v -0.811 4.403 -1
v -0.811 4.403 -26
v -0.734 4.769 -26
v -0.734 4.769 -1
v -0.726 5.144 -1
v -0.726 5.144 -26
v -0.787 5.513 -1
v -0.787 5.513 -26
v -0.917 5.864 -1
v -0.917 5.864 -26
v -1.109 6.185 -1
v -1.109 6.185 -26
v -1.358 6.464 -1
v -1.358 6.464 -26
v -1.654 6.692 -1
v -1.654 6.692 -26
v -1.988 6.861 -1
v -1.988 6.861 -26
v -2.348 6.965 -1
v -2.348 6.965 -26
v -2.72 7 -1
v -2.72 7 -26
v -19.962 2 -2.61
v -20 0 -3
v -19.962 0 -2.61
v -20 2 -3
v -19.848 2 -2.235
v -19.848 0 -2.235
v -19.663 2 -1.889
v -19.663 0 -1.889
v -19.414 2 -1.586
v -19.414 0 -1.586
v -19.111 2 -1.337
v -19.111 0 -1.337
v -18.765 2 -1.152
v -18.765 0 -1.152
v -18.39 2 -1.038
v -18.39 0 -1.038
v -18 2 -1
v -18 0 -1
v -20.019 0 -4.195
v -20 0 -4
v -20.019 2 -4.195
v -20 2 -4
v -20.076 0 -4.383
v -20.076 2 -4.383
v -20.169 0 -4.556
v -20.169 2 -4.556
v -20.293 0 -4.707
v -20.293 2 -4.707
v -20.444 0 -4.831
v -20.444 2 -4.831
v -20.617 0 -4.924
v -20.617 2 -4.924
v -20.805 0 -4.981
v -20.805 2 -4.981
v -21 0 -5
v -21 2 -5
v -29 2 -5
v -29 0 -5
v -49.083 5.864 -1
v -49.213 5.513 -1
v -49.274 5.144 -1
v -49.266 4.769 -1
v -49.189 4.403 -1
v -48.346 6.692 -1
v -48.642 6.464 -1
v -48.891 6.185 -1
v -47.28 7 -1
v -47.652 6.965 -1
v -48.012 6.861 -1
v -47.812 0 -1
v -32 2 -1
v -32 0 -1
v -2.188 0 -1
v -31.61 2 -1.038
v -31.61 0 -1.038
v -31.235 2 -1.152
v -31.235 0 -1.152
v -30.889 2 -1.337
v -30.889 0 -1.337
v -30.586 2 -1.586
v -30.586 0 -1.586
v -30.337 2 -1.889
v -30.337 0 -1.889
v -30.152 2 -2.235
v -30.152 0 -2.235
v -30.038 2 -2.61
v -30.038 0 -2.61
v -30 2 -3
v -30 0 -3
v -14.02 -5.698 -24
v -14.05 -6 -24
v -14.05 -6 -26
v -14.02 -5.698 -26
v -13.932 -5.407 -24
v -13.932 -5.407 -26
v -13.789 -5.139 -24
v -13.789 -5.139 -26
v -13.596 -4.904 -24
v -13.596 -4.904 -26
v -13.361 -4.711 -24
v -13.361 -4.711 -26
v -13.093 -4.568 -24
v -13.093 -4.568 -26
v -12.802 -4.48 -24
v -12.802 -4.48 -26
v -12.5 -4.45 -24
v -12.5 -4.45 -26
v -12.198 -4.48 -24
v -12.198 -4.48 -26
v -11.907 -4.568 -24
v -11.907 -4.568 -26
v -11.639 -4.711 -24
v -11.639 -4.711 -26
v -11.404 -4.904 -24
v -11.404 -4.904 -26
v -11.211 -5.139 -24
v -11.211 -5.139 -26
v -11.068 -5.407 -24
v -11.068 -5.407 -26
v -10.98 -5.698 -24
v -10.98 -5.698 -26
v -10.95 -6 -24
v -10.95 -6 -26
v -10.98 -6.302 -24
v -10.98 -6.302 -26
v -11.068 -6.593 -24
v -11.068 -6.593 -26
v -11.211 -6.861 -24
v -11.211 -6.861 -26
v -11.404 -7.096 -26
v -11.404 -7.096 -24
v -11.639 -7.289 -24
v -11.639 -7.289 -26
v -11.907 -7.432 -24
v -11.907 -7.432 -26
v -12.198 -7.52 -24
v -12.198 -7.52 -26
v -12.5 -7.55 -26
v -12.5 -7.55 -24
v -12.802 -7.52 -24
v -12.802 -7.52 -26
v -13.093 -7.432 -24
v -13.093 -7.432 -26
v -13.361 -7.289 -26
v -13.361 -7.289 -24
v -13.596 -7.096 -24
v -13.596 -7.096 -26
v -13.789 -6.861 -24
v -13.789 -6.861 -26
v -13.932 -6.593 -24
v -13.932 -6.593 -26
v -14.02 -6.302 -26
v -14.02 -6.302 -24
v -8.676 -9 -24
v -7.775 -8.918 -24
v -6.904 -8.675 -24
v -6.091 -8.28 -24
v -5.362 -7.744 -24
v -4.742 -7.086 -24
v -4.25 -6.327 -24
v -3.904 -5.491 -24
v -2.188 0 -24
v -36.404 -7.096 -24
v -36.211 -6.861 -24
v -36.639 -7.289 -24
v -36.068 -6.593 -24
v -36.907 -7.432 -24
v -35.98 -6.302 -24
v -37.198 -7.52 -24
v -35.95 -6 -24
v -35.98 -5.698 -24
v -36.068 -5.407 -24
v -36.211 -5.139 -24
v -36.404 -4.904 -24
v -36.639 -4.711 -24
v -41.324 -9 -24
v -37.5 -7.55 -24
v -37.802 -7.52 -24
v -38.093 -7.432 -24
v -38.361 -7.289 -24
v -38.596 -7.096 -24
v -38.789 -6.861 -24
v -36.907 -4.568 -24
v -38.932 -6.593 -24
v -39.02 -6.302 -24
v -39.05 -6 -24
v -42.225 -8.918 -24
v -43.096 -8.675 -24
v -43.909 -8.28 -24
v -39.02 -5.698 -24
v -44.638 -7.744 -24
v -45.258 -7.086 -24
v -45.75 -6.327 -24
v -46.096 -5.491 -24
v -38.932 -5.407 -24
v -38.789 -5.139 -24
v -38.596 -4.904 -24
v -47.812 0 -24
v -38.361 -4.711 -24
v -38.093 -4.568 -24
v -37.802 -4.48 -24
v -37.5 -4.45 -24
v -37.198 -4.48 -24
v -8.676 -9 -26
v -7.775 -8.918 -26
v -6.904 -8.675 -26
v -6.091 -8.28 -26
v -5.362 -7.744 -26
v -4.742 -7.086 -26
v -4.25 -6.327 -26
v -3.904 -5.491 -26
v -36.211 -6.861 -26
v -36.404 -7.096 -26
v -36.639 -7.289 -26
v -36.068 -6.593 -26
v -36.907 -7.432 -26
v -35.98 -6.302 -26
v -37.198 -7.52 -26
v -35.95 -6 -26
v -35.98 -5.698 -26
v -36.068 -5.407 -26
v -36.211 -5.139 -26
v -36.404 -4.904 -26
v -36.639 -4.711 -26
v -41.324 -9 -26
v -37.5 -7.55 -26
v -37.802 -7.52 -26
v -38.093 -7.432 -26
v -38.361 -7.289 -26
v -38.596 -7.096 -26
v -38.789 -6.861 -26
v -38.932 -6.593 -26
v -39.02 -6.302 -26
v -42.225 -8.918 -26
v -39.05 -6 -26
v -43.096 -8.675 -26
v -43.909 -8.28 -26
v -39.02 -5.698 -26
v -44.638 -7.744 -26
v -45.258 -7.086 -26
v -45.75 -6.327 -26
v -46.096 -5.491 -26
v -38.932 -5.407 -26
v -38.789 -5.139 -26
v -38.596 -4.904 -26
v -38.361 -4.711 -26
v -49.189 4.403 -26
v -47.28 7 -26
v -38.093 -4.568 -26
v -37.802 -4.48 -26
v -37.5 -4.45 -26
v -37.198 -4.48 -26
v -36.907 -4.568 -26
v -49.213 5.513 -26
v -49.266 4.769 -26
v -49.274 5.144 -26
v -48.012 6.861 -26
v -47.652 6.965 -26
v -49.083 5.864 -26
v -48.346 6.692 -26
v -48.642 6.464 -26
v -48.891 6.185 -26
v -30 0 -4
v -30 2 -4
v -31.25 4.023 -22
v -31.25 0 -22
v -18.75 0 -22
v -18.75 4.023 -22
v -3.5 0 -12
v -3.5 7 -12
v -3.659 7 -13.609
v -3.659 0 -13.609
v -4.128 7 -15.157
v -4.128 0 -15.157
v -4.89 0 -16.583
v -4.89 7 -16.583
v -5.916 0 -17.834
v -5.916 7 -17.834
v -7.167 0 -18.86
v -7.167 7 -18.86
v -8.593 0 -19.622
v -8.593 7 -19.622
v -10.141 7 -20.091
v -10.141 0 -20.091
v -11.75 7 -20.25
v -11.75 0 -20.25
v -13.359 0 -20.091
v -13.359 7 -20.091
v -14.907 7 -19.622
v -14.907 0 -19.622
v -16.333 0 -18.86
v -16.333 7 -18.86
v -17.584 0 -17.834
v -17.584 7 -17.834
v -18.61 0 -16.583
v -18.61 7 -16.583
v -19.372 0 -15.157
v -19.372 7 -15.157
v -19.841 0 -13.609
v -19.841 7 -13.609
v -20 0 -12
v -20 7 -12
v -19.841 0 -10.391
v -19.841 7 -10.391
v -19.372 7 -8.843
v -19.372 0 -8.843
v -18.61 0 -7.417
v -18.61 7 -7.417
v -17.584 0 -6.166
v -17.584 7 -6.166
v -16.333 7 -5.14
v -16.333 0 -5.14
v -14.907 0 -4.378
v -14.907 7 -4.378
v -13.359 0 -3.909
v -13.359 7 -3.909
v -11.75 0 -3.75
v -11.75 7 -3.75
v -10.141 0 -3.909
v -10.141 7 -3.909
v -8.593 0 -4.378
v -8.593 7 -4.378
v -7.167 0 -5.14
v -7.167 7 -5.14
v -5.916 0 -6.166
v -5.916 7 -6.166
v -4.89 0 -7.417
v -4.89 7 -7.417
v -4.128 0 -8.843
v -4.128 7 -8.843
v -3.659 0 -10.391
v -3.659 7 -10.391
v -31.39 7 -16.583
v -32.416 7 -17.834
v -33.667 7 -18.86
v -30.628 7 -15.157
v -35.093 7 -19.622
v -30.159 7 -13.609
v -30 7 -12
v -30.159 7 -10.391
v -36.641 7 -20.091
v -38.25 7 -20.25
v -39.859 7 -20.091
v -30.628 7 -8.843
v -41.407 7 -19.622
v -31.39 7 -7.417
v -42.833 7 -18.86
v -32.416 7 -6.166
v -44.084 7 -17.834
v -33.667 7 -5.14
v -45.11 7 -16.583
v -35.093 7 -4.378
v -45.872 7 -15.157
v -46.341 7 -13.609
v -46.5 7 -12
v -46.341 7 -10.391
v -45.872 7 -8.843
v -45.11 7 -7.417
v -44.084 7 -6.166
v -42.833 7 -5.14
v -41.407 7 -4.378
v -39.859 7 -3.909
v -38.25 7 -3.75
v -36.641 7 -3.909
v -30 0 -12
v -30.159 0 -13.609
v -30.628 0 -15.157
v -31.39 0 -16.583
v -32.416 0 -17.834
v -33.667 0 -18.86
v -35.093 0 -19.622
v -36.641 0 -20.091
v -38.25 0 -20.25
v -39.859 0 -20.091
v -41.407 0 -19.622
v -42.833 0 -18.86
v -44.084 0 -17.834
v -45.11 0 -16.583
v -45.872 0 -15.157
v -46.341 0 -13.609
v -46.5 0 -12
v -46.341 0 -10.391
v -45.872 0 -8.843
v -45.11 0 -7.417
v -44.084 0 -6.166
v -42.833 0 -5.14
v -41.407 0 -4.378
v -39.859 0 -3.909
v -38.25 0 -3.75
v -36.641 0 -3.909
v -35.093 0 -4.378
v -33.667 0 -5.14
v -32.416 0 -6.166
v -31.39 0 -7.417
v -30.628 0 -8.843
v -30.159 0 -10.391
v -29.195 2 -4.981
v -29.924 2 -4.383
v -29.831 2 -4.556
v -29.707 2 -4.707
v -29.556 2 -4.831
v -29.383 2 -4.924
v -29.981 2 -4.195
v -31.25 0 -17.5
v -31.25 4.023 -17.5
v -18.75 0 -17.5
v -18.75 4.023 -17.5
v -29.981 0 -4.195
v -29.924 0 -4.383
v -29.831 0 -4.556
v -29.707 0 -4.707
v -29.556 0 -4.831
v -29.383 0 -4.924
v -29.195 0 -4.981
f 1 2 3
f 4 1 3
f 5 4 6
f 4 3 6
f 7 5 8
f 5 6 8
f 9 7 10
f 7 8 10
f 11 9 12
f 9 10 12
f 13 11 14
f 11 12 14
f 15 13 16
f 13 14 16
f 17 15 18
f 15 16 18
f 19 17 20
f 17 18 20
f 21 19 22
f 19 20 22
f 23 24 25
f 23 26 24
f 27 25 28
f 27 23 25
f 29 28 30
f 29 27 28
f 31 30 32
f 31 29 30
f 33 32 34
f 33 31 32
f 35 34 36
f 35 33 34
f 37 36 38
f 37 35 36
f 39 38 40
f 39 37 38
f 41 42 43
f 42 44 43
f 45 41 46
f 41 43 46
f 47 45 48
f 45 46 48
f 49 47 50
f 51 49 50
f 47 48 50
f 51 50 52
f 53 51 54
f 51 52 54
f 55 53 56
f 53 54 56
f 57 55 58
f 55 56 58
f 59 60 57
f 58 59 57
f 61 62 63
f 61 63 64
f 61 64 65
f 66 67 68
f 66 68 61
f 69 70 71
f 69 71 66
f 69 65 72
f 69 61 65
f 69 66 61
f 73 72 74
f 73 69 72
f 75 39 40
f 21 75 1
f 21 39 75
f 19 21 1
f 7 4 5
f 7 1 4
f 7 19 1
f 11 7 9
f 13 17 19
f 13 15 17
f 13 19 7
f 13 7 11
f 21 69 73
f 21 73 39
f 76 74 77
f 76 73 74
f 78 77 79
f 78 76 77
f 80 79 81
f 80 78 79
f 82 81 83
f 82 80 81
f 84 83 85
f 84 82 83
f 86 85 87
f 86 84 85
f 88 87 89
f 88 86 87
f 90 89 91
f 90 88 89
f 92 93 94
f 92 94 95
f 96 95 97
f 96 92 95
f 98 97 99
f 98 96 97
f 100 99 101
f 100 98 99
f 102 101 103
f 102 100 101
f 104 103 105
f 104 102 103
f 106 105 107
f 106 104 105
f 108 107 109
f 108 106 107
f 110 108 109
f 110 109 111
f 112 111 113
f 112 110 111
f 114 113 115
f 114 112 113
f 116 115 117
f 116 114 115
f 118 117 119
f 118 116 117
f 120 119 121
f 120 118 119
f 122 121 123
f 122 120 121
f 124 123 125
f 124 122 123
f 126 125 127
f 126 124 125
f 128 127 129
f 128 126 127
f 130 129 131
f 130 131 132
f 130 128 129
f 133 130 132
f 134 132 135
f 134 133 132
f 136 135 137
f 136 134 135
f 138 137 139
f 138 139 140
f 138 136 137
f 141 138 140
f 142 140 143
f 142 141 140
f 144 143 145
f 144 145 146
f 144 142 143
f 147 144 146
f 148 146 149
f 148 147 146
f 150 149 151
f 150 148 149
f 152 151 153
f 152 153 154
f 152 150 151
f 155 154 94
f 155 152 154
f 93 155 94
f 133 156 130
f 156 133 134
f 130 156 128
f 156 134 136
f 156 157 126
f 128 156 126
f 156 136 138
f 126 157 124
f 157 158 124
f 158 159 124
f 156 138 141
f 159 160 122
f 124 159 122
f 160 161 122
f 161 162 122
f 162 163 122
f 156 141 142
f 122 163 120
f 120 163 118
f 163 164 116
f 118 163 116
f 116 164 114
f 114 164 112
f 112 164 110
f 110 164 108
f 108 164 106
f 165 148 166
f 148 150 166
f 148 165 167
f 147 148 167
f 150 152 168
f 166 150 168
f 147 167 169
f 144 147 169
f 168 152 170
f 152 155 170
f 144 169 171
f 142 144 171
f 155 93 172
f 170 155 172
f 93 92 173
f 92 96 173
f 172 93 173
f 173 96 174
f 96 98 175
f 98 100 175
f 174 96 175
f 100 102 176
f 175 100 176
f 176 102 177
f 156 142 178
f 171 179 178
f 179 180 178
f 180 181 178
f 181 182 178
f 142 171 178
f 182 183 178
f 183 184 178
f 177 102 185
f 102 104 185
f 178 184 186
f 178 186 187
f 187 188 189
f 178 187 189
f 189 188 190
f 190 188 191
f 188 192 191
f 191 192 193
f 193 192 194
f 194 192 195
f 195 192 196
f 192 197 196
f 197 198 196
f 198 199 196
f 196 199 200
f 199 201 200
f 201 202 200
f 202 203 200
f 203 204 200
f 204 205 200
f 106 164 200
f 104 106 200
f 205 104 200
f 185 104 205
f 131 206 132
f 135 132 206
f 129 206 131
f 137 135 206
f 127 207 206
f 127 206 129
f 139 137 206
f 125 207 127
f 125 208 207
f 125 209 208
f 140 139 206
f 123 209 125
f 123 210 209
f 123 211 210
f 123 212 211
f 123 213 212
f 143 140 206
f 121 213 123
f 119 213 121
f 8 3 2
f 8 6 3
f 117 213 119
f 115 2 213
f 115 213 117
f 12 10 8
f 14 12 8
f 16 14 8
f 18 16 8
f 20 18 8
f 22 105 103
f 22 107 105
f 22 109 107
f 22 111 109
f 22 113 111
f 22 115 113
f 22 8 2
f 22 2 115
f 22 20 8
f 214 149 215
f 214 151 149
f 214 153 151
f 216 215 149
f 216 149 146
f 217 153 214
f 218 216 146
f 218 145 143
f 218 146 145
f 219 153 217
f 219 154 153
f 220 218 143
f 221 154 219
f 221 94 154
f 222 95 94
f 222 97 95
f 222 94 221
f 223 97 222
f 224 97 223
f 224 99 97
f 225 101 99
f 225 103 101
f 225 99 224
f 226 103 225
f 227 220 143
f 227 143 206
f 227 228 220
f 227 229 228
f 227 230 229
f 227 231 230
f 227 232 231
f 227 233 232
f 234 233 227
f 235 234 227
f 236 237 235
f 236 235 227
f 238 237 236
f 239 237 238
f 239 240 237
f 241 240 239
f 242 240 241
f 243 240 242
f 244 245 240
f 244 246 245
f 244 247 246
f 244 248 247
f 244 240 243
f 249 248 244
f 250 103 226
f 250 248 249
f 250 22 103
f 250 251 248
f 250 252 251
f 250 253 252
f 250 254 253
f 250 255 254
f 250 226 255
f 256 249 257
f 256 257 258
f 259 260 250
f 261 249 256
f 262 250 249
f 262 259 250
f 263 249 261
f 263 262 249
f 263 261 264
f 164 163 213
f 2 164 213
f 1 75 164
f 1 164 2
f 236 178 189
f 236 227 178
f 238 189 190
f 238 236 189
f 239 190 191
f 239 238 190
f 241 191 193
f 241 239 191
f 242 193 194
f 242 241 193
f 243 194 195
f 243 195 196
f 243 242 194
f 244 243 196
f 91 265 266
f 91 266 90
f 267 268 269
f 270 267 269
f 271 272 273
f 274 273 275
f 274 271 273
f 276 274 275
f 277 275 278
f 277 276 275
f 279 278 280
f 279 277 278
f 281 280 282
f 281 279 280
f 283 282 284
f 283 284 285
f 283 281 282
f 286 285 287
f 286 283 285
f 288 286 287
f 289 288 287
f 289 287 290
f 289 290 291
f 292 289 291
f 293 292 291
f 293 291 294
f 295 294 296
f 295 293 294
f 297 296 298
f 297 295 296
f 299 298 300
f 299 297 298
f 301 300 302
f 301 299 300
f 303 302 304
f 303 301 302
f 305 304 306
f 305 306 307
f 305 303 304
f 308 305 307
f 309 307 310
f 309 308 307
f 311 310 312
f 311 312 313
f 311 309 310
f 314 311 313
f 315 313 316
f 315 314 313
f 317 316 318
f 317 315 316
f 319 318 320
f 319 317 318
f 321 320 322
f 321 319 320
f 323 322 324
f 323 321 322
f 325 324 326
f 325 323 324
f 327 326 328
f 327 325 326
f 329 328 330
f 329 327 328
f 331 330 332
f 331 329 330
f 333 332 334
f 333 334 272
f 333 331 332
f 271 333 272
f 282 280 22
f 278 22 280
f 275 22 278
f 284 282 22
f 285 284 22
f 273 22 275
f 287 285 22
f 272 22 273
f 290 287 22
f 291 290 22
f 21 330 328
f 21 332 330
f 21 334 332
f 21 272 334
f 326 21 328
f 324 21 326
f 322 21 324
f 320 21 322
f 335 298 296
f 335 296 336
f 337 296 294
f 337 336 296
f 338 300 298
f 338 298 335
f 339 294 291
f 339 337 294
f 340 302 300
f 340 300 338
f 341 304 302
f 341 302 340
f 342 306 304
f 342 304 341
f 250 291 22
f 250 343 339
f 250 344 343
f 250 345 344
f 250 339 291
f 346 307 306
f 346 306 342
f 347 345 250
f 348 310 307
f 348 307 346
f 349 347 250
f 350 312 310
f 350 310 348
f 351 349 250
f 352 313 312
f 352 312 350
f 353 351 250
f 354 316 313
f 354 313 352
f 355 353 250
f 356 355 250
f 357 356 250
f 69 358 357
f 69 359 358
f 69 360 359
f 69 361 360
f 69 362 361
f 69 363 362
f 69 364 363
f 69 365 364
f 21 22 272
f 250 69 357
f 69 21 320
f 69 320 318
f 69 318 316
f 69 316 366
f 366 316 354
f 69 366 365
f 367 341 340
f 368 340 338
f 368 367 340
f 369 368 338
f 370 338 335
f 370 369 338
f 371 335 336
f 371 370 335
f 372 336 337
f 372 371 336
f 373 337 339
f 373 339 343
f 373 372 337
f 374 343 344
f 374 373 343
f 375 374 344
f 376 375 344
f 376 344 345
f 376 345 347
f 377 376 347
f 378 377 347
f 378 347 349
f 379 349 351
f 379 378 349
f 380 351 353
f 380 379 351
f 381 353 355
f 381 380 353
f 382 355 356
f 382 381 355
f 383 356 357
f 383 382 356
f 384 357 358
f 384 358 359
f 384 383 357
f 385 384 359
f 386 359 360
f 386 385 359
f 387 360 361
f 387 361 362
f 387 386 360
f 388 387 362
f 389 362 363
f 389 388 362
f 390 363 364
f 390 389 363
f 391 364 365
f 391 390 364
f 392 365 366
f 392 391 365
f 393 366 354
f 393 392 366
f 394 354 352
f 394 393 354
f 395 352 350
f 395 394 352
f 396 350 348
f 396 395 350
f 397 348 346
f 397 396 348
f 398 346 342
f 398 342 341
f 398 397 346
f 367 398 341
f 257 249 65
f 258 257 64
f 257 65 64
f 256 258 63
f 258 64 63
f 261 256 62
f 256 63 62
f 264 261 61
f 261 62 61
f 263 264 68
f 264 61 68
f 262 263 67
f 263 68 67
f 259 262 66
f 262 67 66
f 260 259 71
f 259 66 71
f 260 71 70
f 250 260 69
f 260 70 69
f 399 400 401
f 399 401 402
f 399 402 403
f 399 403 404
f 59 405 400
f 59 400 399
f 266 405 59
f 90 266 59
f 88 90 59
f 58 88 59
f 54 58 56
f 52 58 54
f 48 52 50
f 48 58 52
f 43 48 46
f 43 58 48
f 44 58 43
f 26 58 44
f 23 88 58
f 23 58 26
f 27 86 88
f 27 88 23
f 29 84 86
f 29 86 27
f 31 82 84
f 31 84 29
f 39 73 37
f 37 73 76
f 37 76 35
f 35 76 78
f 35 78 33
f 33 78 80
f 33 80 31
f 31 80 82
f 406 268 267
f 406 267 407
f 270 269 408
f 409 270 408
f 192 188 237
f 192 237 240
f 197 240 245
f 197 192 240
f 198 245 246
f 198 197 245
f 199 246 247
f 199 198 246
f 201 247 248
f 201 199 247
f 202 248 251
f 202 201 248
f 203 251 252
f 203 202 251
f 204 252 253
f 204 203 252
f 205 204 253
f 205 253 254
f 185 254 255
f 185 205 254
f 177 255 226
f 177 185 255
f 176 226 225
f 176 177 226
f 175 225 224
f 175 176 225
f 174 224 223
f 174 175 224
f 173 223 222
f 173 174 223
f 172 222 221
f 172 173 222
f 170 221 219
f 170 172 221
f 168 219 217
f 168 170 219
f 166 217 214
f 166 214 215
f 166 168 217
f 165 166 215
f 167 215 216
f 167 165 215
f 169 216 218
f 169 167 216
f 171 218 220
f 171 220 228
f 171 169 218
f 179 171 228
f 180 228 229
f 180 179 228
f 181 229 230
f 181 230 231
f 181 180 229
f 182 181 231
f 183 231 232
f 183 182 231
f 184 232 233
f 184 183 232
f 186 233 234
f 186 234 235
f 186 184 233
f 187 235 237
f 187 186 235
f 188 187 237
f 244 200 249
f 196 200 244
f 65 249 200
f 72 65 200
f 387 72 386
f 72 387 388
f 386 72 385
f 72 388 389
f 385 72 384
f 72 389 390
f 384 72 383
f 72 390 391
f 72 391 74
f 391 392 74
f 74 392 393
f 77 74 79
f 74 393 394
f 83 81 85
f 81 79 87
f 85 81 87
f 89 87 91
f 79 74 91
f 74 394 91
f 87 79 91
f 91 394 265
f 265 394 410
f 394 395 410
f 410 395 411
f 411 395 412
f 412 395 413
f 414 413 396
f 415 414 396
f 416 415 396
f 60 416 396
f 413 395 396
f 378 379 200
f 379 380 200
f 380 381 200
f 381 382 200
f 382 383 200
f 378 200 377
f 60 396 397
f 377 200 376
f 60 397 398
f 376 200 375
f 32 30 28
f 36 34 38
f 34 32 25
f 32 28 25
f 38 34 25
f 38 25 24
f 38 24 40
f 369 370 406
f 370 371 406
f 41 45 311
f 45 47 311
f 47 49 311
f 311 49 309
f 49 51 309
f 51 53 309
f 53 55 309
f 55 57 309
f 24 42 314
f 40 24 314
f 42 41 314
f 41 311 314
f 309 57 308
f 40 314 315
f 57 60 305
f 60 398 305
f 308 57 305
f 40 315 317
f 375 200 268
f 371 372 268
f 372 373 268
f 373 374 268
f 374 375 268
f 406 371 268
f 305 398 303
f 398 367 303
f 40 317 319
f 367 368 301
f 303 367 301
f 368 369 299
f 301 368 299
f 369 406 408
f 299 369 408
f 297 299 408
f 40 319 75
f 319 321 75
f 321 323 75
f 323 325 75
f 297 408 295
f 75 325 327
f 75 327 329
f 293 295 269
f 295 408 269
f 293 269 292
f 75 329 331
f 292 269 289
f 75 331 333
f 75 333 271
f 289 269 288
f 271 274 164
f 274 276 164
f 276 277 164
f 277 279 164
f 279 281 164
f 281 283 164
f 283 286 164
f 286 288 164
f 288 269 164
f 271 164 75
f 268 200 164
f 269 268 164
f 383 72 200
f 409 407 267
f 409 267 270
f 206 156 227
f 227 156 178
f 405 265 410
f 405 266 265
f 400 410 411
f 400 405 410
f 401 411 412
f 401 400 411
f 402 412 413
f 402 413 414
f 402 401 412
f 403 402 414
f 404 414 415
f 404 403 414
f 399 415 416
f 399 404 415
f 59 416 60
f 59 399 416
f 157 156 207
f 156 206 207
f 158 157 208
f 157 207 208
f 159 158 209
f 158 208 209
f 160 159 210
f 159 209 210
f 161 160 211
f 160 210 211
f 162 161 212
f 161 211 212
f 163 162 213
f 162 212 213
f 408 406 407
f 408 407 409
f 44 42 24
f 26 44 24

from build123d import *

# Parameters (mm, degrees)
SKETCH1_W               = 50
SKETCH1_H               = 24
SKETCH1_R               = 8.25
BOSS_EXTRUDE1_DEPTH     = 7
SKETCH2_W               = 12.5
SKETCH2_H               = 4.5
CUT_EXTRUDE1_DEPTH      = 4.022504106
SKETCH3_W               = 50
SKETCH3_H               = 16
SKETCH3_R               = 1.55
BOSS_EXTRUDE2_DEPTH     = 2
CUT_EXTRUDE2_DEPTH      = 25
CUT_EXTRUDE2_DEPTH_BACK = 3
FILLET1_R               = 5
FILLET2_R               = 2
SKETCH5_W               = 57.1125727
SKETCH5_H               = 23.157416517
CUT_EXTRUDE3_DEPTH      = 1
SKETCH6_W               = 10
SKETCH6_H               = 4
CUT_EXTRUDE4_DEPTH      = 2
FILLET3_R               = 1
FILLET4_R               = 2


with BuildPart() as part:
    # Sketch1 → Boss-Extrude1 (new body)
    with BuildSketch(Plane(origin=(0, 0, 0), x_dir=(1, 0, 0), z_dir=(0, 1, 0))):
        with Locations((-25, 12)):
            Rectangle(SKETCH1_W, SKETCH1_H)
        with Locations((-38.25, 12)):
            Circle(SKETCH1_R, mode=Mode.SUBTRACT)
        with Locations((-11.75, 12)):
            Circle(SKETCH1_R, mode=Mode.SUBTRACT)
    extrude(amount=BOSS_EXTRUDE1_DEPTH)

    # Sketch2 → Cut-Extrude1 (cut)
    with BuildSketch(Plane.XZ):
        with Locations((-25, -19.75)):
            Rectangle(SKETCH2_W, SKETCH2_H)
    extrude(amount=-CUT_EXTRUDE1_DEPTH, mode=Mode.SUBTRACT)

    # Sketch3 → Boss-Extrude2 (add)
    with BuildSketch(Plane(origin=(0, 0, -24), x_dir=(-1, 0, 0), z_dir=(0, 0, -1))):
        with Locations((25, -1)):
            Rectangle(SKETCH3_W, SKETCH3_H)
        with Locations((12.5, -6)):
            Circle(SKETCH3_R, mode=Mode.SUBTRACT)
        with Locations((37.5, -6)):
            Circle(SKETCH3_R, mode=Mode.SUBTRACT)
    extrude(amount=BOSS_EXTRUDE2_DEPTH)

    # Sketch4 → Cut-Extrude2 (cut, two sides)
    with BuildSketch(Plane.XY.offset(-24)) as cut_extrude2_sk:
        Polygon((-50, 7), (-45, -9), (-50, -9), align=None)
        Polygon((0, 7), (0, -9), (-5, -9), align=None)
    extrude(amount=CUT_EXTRUDE2_DEPTH, mode=Mode.SUBTRACT)
    extrude(cut_extrude2_sk.sketch, amount=-CUT_EXTRUDE2_DEPTH_BACK, mode=Mode.SUBTRACT)

    # Fillet1
    fillet1_edges = [part.edges().sort_by_distance(p)[0] for p in [
        (-45, -9, -25),
        (-5, -9, -25),
    ]]
    fillet(fillet1_edges, radius=FILLET1_R)

    # Fillet2
    fillet2_edges = [part.edges().sort_by_distance(p)[0] for p in [
        (0, 7, -13),
        (-50, 7, -13),
    ]]
    fillet(fillet2_edges, radius=FILLET2_R)

    # Sketch5 → Cut-Extrude3 (cut)
    with BuildSketch(Plane.XY):
        with Locations((-24.983022422, 0.513257307)):
            Rectangle(SKETCH5_W, SKETCH5_H)
    extrude(amount=-CUT_EXTRUDE3_DEPTH, mode=Mode.SUBTRACT)

    # Sketch6 → Cut-Extrude4 (cut)
    with BuildSketch(Plane.XZ):
        with Locations((-25, -3)):
            Rectangle(SKETCH6_W, SKETCH6_H)
    extrude(amount=-CUT_EXTRUDE4_DEPTH, mode=Mode.SUBTRACT)

    # Fillet3
    fillet3_edges = [part.edges().sort_by_distance(p)[0] for p in [
        (-30, 1, -5),
        (-20, 1, -5),
    ]]
    fillet(fillet3_edges, radius=FILLET3_R)

    # Fillet4
    fillet4_edges = [part.edges().sort_by_distance(p)[0] for p in [
        (-30, 1, -1),
        (-20, 1, -1),
    ]]
    fillet(fillet4_edges, radius=FILLET4_R)


solid = part.part
